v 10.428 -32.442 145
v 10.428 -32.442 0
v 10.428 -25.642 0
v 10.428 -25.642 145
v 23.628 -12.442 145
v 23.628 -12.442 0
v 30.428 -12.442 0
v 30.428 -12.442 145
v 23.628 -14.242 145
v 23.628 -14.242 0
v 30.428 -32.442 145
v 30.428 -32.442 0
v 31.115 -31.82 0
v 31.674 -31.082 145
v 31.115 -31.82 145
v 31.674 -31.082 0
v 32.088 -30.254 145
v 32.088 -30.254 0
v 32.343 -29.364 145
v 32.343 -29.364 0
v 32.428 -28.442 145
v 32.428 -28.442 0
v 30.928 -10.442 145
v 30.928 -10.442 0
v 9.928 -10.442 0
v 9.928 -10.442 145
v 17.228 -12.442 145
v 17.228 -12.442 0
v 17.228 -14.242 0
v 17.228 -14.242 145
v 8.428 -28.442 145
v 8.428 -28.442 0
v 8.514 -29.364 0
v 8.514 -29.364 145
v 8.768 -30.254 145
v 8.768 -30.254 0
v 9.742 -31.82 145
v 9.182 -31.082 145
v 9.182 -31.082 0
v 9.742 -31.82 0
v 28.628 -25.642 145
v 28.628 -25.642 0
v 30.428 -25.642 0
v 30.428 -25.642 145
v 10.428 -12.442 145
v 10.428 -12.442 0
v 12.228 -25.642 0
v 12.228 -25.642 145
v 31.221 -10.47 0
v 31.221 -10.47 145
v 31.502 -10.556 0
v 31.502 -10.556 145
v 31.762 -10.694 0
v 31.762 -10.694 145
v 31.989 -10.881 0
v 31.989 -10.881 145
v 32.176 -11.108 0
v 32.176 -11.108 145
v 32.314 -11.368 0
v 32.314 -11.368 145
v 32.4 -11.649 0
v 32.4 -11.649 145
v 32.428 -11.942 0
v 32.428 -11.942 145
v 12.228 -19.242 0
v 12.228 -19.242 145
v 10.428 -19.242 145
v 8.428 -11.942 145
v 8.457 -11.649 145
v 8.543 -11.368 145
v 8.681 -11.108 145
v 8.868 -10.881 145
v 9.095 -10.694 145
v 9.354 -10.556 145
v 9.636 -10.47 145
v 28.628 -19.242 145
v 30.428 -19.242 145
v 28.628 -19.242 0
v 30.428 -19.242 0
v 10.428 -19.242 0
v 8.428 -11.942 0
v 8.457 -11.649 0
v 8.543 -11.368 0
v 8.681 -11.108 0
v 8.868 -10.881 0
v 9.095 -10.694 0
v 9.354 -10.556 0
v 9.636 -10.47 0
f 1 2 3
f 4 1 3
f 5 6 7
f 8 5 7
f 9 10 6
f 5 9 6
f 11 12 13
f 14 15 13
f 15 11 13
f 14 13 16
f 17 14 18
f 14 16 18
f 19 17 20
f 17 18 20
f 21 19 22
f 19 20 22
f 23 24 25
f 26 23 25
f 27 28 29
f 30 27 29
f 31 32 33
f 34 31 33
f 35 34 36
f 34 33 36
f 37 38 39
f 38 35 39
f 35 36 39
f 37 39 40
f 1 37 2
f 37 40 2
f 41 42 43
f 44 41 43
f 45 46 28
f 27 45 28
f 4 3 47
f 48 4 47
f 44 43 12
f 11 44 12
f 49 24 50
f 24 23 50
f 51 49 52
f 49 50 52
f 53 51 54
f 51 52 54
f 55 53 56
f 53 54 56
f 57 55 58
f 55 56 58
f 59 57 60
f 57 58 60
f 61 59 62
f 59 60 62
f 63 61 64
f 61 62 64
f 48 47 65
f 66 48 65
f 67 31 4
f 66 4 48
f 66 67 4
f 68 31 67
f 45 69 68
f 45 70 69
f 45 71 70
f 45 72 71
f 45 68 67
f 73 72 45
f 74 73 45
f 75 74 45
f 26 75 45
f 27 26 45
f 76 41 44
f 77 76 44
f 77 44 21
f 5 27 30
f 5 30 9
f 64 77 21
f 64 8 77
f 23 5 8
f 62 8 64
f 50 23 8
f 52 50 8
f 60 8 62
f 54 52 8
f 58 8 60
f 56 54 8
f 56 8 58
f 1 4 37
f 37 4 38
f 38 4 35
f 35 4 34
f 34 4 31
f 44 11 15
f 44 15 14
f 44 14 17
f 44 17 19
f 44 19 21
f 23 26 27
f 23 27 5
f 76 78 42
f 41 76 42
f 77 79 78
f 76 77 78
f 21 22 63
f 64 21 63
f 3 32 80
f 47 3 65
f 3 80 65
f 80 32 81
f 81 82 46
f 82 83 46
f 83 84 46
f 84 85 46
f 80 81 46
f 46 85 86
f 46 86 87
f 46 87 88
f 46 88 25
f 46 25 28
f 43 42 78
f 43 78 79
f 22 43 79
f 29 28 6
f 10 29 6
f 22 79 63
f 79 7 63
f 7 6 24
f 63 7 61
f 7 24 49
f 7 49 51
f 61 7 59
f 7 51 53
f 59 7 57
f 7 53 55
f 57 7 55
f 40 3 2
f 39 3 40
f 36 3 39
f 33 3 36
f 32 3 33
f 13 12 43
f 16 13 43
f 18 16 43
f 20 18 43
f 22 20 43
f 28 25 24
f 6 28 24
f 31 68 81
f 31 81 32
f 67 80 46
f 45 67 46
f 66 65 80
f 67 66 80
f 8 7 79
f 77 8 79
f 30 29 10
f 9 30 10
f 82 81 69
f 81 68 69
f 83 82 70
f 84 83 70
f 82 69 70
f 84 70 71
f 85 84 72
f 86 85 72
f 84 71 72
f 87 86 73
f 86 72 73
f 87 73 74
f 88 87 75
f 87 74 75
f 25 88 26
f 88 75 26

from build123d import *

# Parameters (mm, degrees)
F1_DEPTH    = 145
F2_T1_DEPTH = 165
F3_R        = 1.5


# Not quite as in the source:
# - a fillet or chamfer that OpenCascade refuses, or shapes differently, is made with other operations: its cross-section is extruded or revolved along the edge and cut away or added


with BuildPart() as f1:
    # F0 (on Top) → F1 (new body)
    with BuildSketch(Plane.XY):
        Polygon((8.4283615947, -32.4416384101), (10.4283615947, -32.4416384101), (10.4283615947, -25.6416384101), (12.2283615947, -25.6416384101), (12.2283615947, -19.2416384101), (10.4283615947, -19.2416384101), (10.4283615947, -12.4416384101), (17.2283615947, -12.4416384101), (17.2283615947, -14.2416384101), (23.6283615947, -14.2416384101), (23.6283615947, -12.4416384101), (30.4283615947, -12.4416384101), (30.4283615947, -19.2416384101), (28.6283615947, -19.2416384101), (28.6283615947, -25.6416384101), (30.4283615947, -25.6416384101), (30.4283615947, -32.4416384101), (32.4283615947, -32.4416384101), (32.4283615947, -10.4416384101), (8.4283615947, -10.4416384101), align=None)
    extrude(amount=F1_DEPTH)

    # F2: fillet of radius 5 on 2 edges, made by hand

    # F2_s2 → F2_t1 (cut)
    with BuildSketch(Plane.XY.offset(-10)):
        with BuildLine():
            ThreePointArc((8.4283615947, -28.4416384101), (8.9562256397, -30.6777063876), (10.4283615947, -32.4416384101))
            Line((10.4283615947, -32.4416384101), (8.4283615947, -32.4416384101))
            Line((8.4283615947, -32.4416384101), (8.4283615947, -28.4416384101))
        make_face()
        with BuildLine():
            ThreePointArc((30.4283615947, -32.4416384101), (31.9004975497, -30.6777063876), (32.4283615947, -28.4416384101))
            Line((32.4283615947, -28.4416384101), (32.4283615947, -32.4416384101))
            Line((32.4283615947, -32.4416384101), (30.4283615947, -32.4416384101))
        make_face()
    extrude(amount=F2_T1_DEPTH, mode=Mode.SUBTRACT)

    # F3
    f3_edges = [f1.edges().sort_by_distance(p)[0] for p in [
        (8.428362, -10.441638, 72.5),
        (32.428362, -10.441638, 72.5),
    ]]
    fillet(f3_edges, radius=F3_R)


solid = f1.part
